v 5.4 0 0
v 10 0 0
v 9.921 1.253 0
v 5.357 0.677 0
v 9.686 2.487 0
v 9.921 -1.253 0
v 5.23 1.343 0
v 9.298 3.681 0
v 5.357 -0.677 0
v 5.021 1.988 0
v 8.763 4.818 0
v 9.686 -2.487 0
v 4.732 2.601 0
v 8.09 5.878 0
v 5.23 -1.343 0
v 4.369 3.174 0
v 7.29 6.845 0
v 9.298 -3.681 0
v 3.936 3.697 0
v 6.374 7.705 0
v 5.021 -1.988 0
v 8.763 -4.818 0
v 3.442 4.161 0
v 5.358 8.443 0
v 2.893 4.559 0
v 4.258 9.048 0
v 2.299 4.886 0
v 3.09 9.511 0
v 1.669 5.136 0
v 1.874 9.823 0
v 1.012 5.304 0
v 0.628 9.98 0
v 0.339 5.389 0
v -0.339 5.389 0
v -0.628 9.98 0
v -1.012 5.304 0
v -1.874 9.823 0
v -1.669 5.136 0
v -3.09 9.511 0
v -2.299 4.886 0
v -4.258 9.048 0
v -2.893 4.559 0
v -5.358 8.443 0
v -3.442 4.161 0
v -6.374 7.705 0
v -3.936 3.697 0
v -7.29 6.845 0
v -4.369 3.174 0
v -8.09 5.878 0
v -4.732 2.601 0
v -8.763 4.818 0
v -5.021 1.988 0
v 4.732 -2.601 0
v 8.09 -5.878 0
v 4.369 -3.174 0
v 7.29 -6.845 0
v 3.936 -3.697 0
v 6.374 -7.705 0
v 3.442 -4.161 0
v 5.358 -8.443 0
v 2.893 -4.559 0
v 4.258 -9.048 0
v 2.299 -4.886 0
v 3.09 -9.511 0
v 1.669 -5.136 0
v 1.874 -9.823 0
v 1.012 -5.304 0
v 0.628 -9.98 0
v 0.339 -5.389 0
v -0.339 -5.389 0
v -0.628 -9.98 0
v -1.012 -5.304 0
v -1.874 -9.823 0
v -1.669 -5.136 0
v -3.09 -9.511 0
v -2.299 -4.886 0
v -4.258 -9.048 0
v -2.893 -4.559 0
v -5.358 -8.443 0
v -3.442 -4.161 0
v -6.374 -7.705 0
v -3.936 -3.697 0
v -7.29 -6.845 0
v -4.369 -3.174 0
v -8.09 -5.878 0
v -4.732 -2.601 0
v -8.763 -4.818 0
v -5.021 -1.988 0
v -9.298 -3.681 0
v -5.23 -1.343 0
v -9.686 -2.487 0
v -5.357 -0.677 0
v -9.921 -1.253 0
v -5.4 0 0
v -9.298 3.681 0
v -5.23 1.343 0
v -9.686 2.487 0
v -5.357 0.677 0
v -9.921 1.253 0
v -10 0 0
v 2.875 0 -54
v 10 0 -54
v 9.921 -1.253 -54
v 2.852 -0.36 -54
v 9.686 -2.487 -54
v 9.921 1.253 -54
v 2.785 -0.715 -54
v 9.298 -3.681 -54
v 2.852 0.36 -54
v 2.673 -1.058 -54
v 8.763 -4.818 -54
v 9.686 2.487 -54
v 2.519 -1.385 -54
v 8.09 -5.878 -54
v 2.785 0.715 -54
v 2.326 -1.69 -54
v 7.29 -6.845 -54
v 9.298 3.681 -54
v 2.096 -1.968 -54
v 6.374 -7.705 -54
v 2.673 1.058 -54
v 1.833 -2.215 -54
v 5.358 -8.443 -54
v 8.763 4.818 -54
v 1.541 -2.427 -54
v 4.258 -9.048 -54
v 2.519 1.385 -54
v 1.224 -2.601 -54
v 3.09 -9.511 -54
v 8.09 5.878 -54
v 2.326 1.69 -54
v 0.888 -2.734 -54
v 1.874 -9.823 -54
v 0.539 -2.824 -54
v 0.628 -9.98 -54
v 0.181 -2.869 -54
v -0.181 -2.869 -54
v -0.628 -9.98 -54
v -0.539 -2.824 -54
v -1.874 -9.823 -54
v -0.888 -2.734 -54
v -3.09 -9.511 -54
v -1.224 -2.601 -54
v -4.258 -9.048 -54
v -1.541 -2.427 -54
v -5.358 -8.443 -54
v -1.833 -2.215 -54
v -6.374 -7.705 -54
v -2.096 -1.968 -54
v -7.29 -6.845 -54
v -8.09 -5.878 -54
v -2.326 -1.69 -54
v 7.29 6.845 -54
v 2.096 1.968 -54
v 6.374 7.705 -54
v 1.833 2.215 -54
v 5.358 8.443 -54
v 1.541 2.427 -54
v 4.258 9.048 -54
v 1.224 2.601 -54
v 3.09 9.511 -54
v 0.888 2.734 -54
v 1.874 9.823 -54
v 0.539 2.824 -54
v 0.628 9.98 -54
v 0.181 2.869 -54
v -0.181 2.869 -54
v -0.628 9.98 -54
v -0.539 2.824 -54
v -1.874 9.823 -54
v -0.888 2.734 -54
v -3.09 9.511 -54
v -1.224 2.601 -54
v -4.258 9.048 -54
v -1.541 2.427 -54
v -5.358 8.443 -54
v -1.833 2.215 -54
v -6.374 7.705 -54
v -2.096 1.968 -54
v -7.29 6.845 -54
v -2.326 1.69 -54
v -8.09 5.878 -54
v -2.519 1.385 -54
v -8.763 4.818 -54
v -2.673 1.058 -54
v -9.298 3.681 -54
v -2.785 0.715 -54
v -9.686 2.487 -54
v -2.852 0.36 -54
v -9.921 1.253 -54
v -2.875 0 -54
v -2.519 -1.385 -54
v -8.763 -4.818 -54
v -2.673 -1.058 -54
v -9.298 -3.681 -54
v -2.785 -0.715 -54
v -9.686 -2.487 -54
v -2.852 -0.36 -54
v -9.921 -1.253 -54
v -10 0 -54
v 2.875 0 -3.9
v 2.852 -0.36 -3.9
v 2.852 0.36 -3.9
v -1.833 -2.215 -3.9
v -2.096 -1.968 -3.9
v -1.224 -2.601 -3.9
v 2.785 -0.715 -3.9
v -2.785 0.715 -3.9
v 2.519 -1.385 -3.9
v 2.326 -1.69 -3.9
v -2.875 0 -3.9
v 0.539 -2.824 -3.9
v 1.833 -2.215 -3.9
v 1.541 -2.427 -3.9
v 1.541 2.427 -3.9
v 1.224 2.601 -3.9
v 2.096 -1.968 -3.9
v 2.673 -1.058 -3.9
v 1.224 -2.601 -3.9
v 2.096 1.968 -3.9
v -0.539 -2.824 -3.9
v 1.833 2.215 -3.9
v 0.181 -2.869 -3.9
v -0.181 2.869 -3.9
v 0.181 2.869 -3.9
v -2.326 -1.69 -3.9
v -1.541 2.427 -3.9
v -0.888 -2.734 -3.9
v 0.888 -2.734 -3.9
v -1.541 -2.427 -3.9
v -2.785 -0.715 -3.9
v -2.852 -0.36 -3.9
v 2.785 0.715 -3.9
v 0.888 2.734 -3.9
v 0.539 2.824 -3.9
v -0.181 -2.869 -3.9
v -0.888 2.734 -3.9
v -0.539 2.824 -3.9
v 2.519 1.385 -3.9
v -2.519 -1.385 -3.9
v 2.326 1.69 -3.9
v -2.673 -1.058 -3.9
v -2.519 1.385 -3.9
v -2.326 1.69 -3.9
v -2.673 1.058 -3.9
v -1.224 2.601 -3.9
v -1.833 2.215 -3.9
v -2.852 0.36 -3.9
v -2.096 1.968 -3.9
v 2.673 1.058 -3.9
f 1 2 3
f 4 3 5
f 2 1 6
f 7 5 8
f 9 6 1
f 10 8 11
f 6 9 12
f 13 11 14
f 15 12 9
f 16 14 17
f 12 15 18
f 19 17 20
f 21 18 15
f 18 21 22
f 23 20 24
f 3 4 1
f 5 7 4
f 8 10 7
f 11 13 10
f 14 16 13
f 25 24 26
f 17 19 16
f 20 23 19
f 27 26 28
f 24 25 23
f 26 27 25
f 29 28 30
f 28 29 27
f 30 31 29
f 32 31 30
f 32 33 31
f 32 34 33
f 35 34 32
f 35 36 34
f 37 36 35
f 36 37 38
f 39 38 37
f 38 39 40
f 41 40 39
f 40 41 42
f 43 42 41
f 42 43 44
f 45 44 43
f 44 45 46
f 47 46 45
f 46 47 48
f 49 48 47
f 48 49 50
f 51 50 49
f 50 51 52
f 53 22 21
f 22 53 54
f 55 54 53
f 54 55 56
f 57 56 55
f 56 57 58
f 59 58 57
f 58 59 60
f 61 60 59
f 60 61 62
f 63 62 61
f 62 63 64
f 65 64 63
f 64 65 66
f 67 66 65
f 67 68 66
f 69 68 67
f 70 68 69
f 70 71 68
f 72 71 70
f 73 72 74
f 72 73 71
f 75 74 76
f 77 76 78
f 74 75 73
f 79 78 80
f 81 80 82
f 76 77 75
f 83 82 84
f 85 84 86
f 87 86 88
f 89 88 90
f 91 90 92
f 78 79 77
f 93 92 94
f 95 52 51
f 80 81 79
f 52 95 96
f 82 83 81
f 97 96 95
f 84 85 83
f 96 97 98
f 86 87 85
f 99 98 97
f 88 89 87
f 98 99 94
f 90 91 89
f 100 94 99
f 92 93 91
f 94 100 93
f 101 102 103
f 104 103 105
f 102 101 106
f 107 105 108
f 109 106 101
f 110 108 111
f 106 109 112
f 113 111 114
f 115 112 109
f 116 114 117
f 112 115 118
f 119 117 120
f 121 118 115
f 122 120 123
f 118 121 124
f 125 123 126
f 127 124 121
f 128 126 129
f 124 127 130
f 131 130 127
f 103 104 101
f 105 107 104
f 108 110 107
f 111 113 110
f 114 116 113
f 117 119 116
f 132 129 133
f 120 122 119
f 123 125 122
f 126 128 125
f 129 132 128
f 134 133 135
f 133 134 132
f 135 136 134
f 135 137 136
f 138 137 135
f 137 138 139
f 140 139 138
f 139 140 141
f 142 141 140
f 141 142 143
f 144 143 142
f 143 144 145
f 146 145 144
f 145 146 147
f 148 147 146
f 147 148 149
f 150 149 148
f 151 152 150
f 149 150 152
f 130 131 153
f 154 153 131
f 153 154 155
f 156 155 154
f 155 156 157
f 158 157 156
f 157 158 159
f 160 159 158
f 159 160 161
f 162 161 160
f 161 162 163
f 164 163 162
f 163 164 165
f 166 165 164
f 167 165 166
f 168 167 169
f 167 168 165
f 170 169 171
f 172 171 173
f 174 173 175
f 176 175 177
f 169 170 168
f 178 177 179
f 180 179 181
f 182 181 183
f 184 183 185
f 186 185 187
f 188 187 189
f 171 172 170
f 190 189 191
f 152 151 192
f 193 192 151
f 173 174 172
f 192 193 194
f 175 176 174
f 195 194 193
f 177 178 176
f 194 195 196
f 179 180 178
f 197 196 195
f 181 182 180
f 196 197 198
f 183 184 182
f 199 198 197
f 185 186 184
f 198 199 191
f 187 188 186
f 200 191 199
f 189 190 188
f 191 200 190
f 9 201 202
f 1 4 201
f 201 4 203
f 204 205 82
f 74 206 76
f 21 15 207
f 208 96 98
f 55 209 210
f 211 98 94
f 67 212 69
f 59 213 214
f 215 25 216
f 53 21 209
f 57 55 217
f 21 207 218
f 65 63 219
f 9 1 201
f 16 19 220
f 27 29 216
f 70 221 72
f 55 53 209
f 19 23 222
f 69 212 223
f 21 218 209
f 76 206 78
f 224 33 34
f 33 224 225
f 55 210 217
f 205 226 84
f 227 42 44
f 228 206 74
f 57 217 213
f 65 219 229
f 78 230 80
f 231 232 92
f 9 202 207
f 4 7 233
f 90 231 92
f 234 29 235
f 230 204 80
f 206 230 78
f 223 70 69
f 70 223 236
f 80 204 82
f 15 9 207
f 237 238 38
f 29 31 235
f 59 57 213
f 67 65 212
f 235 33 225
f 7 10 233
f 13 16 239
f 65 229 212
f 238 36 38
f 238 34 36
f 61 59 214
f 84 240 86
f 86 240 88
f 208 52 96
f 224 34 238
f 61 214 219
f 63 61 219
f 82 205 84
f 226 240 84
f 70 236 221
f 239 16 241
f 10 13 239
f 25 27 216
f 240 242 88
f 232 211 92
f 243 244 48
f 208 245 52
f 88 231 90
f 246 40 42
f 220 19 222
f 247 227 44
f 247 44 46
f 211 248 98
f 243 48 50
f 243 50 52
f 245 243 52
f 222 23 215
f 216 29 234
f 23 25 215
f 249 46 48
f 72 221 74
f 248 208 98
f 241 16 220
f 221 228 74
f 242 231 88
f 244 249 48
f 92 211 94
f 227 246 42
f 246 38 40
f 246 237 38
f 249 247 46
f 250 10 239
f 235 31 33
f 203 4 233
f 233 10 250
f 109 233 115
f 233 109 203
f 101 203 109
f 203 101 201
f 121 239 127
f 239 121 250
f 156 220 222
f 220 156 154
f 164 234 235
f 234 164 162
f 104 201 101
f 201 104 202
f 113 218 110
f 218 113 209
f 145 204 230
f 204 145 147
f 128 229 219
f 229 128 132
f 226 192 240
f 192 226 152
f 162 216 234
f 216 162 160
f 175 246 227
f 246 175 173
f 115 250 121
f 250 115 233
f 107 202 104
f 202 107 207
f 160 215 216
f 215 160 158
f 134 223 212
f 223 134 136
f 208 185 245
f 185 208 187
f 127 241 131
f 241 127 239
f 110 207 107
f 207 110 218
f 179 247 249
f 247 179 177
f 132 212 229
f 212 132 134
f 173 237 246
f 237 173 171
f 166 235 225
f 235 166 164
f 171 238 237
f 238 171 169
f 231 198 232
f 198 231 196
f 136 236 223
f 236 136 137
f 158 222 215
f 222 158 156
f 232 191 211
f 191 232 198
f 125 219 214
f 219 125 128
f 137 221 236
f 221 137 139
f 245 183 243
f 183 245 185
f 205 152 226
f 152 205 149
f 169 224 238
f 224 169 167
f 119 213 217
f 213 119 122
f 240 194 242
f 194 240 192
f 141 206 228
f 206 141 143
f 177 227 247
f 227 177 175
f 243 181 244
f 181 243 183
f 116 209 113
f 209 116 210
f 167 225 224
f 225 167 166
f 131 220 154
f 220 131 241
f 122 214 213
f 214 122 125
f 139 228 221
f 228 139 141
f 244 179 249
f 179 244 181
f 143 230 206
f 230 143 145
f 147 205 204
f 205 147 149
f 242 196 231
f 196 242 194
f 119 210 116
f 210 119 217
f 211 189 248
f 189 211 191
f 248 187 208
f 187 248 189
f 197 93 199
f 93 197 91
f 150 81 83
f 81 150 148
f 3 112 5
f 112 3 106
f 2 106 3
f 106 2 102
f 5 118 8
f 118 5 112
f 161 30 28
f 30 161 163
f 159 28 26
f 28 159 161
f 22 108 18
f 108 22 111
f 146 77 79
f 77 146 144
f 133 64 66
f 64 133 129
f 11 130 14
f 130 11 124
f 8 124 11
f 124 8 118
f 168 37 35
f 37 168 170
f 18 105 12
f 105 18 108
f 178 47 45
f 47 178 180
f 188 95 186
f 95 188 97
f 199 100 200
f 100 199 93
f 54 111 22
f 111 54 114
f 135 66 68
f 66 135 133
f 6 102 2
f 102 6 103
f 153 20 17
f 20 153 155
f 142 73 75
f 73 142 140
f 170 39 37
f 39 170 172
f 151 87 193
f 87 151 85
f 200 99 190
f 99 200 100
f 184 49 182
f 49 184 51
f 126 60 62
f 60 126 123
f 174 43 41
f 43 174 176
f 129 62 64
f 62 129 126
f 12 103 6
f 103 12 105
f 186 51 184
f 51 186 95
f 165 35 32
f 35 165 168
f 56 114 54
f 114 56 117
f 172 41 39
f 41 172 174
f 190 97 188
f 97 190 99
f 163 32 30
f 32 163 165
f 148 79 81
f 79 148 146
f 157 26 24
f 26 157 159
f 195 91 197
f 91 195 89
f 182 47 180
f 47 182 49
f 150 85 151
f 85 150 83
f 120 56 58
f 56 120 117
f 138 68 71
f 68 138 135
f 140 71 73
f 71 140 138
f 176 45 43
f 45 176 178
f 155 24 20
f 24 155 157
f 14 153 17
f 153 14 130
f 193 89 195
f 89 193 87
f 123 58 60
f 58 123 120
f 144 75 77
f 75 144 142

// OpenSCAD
$fn = 50;


difference() {
	union() {
		translate(v = [0, 0, -54.0000000000]) {
			cylinder(h = 54, r = 10.0000000000);
		}
		cylinder(h = 0, r = 20.0000000000);
	}
	union() {
		translate(v = [0, 0, 0]) {
			rotate(a = [0, 0, 0]) {
				difference() {
					union() {
						#translate(v = [0, 0, -54.0000000000]) {
							cylinder(h = 54, r = 2.6000000000);
						}
						#translate(v = [0, 0, -3.9000000000]) {
							cylinder(h = 3.9000000000, r = 10.0000000000, r1 = 2.8750000000, r2 = 5.4000000000);
						}
						#translate(v = [0, 0, -54.0000000000]) {
							cylinder(h = 54, r = 2.8750000000);
						}
						#translate(v = [0, 0, -54.0000000000]) {
							cylinder(h = 54, r = 2.6000000000);
						}
					}
					union();
				}
			}
		}
	}
}
